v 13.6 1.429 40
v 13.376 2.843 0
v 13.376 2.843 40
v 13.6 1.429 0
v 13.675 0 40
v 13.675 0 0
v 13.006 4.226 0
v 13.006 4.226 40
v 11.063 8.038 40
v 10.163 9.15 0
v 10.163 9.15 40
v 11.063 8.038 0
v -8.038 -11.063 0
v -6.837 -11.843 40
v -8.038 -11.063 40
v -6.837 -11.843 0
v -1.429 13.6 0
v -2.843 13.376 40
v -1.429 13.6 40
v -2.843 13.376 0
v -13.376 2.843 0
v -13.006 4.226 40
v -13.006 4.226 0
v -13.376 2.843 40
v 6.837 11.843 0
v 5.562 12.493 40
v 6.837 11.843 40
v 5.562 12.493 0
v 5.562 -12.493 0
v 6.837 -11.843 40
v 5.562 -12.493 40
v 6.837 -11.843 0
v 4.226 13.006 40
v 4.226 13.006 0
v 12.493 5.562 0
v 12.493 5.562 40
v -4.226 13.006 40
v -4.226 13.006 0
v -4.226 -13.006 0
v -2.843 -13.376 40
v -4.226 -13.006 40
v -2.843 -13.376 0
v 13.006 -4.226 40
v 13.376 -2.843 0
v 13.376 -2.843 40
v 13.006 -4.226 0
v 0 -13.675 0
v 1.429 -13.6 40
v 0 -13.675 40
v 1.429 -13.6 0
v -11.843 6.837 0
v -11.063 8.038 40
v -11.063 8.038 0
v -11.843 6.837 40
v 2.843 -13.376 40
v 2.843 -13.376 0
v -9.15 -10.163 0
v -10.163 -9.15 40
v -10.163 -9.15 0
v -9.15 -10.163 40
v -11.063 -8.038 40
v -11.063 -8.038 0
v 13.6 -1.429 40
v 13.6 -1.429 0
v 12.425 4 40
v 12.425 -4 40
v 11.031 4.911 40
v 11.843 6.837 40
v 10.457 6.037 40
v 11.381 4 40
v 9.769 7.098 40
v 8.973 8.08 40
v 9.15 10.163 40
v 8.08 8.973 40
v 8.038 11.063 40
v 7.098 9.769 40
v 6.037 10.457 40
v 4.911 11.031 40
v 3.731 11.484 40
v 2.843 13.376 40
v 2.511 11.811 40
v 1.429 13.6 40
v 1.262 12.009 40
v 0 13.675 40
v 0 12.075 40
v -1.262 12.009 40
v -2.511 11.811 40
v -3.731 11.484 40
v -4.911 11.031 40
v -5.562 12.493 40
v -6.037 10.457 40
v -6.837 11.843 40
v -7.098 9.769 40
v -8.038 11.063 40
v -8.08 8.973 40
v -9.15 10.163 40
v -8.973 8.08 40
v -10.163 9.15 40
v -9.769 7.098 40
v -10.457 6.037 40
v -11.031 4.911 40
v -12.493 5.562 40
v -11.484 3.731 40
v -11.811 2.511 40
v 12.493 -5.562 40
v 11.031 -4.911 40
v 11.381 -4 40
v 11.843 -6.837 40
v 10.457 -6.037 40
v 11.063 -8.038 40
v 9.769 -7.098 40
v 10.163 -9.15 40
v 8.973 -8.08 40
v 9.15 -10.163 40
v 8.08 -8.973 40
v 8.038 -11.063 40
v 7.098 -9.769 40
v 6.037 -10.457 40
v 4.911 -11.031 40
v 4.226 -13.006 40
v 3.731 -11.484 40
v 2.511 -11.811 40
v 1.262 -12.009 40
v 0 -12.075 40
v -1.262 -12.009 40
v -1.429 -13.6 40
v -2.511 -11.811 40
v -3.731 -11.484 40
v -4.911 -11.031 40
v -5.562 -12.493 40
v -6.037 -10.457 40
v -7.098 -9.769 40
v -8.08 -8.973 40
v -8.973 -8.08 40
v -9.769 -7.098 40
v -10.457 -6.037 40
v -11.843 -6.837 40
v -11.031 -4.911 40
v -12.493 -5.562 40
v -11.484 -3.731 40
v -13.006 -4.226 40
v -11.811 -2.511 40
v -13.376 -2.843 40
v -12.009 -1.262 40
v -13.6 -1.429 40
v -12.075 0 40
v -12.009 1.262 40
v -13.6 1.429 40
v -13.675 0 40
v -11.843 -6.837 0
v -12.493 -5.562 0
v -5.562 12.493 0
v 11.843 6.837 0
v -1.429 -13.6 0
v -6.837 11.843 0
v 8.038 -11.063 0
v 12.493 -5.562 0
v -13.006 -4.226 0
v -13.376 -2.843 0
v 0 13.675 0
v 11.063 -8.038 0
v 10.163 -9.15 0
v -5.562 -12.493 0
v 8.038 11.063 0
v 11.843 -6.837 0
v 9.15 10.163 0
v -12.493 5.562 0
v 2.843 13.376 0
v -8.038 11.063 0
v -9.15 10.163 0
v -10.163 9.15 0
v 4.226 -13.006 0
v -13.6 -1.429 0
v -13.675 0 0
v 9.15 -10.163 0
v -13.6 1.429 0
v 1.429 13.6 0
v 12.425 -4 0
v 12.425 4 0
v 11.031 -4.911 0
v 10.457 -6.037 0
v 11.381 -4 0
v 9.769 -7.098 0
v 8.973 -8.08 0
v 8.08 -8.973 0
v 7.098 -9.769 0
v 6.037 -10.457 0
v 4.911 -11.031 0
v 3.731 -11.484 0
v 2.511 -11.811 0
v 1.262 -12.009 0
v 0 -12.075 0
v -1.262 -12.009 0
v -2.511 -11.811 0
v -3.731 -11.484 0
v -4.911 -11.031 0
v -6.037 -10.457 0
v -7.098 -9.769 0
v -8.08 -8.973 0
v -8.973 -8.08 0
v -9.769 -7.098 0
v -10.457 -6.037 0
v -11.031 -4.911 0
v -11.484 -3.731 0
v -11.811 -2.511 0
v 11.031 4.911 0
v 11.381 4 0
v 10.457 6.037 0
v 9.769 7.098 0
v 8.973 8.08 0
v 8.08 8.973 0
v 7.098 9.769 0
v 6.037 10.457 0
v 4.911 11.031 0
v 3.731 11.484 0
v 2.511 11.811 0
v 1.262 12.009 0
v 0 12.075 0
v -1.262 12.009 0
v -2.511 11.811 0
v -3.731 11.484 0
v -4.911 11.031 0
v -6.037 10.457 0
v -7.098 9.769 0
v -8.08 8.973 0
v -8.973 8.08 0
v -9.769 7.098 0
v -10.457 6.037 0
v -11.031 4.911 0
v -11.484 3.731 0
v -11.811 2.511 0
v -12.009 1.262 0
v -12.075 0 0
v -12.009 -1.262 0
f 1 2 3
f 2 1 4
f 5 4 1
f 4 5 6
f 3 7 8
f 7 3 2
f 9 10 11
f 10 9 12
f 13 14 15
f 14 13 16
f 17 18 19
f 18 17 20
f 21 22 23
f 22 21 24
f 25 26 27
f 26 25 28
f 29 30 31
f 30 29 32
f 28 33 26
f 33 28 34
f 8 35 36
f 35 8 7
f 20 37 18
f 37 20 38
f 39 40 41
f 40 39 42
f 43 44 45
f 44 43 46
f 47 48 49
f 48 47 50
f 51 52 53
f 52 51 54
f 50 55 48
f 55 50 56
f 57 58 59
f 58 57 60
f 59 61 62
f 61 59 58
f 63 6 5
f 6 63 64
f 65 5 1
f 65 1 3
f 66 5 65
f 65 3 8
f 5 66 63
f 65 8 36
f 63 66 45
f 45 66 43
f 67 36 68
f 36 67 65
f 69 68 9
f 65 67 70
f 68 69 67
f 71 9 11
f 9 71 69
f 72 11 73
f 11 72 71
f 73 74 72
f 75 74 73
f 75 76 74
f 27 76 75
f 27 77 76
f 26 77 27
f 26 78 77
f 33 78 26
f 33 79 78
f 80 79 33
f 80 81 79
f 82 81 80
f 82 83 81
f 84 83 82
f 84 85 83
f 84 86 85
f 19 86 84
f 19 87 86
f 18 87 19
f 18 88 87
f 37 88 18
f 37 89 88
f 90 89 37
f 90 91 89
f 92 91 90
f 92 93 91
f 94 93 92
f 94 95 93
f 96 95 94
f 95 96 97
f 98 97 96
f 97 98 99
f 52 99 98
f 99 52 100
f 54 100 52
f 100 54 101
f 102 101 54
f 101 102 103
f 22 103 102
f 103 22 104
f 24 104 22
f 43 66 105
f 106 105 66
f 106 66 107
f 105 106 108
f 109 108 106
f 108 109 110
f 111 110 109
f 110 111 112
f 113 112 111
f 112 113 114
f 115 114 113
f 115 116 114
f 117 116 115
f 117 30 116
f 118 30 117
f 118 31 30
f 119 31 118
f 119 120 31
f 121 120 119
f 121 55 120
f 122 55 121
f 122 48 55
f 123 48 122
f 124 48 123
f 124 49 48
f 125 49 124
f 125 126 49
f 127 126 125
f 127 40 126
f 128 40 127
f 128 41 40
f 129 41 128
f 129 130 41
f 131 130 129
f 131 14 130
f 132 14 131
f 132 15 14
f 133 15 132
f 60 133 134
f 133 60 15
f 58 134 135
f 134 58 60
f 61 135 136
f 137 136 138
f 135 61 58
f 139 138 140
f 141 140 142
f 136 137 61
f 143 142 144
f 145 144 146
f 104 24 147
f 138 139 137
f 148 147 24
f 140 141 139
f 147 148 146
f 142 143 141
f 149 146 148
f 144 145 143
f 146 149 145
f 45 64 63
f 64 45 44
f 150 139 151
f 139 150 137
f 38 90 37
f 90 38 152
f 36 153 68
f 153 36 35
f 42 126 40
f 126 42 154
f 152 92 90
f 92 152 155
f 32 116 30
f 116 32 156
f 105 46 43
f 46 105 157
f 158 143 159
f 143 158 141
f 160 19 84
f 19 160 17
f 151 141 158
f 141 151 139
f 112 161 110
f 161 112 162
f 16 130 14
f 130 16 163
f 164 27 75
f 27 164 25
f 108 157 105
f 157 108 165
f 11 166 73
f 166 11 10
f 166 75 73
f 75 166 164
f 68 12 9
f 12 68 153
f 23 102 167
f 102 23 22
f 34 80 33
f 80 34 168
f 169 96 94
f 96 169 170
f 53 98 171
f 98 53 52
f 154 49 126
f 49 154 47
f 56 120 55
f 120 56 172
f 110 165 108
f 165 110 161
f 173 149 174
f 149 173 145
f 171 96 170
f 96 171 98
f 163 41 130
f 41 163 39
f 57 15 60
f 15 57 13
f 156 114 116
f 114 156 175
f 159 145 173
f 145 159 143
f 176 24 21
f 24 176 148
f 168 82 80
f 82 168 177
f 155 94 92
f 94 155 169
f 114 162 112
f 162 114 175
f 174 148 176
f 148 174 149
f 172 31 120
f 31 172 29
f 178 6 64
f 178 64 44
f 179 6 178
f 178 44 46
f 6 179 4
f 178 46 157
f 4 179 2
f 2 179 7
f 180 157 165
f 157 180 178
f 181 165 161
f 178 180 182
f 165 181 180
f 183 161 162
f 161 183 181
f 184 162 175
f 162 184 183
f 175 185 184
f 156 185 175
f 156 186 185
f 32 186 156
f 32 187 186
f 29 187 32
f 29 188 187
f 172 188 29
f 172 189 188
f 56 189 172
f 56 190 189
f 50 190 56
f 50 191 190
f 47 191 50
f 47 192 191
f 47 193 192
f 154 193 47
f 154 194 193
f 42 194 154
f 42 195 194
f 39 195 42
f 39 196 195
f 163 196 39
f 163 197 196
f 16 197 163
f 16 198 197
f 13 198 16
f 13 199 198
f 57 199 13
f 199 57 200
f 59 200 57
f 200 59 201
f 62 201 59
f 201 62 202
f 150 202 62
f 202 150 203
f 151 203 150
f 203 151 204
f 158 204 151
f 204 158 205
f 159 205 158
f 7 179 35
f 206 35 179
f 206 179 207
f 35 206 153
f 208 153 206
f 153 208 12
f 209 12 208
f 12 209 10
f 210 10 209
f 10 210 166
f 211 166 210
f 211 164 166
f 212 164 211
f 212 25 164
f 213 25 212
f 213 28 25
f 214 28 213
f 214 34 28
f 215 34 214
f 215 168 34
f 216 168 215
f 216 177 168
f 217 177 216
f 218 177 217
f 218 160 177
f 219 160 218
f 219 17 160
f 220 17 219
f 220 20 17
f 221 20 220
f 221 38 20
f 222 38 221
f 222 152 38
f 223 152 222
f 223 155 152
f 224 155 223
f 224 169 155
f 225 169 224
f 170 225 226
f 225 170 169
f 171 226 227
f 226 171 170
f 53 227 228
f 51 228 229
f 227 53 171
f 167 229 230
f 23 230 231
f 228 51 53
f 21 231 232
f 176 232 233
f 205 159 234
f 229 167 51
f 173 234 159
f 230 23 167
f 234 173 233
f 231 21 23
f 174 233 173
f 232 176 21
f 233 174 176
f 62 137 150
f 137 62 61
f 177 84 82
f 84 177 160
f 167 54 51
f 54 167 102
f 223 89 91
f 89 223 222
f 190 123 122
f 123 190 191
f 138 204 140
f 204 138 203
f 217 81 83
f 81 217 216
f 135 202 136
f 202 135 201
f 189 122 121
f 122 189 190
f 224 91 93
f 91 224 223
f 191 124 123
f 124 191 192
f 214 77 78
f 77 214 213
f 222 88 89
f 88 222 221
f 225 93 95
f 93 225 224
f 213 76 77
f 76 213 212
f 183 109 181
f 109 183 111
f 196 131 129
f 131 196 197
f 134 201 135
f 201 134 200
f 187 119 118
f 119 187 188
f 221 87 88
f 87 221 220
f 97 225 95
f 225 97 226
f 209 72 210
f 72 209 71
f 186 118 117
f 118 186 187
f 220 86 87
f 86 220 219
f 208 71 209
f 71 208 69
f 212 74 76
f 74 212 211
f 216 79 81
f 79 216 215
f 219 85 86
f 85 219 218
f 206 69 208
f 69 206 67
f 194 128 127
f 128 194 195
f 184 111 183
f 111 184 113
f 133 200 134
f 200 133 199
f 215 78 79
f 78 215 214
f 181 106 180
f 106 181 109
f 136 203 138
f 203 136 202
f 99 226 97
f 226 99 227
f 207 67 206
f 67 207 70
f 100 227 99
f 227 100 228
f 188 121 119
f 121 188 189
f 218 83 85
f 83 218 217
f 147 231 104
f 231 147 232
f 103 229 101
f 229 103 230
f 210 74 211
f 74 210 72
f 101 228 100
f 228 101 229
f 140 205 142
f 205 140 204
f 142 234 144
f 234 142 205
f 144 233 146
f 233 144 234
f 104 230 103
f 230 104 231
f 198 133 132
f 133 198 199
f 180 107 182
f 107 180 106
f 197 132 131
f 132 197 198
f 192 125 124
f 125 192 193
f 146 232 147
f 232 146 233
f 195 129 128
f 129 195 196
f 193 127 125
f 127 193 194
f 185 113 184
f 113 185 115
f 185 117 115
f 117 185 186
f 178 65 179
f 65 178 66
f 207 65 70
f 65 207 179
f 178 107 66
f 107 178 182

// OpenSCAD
// OpenSCAD: screwdriver button blocker — блокировщик кнопок отвёртки
// Версия: v1.0 — initial

description = "Cylindrical tube that fits over screwdriver to block button presses";
version_str = "1.0";

// ===== Комментарии ===========================
/*
Модель: цилиндрическая втулка для блокировки кнопок отвёртки
Блоки:
- Переменные (вверху) для всех размеров
- Комментарии (этот блок)
- Функции фрагментов детали (ниже)
- Функция вывода всех фрагментов show_all()
- Функция обрезки через intersection при test_fragment=true

Детали: base (основная деталь - полый цилиндр)
Фрагменты:
- base — полый цилиндр с внутренним диаметром 23.8 мм, длиной 40 мм, толщиной стенки 1.2 мм
- notch — прямоугольный вырез в стенке цилиндра (difference): длина 34 мм, ширина 7 мм, глубина 0.5 мм

План: 
- Создать полый цилиндр через difference внешнего и внутреннего цилиндров
- Вырезать паз (notch) в стенке цилиндра для доступа к кнопкам
- Ориентация: цилиндр стоит вертикально, ось Z вверх
*/

use <../modules.scad>;

// ===== Точность аппроксимации окружностей =====
$fn = 0;        // фиксированную сегментацию отключаем
$fa = 6;        // 5–8° обычно достаточно
$fs = 0.35;     // ≈ диаметр сопла (0.3–0.5 для сопла 0.4)
pin_fs = 0.25;  // чуть тоньше для штырей и отверстий

// ===== Режим печати тест‑фрагментов =====
test_fragment = false;   // true — печатать только угловые фрагменты
frag_size     = 20;      // размер квадрата вырезки, мм
frag_index    = 0;       // 0=НЛ, 1=ВЛ, 2=НП, 3=ВП (относительно основания)
frag_gap_x    = 10;      // зазор между фрагментами по X, мм
frag_h_extra  = 20;      // запас по высоте клипа, мм

// ===== Общие доп. параметры =====
tiny = 0.1;                  // небольшой зазор для булевых операций
edge_chamfer_z = 1;       // высота фаски по Z (мм)
edge_chamfer_x = 5;       // горизонтальный вылет фаски по X (с каждой стороны), мм
edge_chamfer_y = 5;       // горизонтальный вылет фаски по Y (с каждой стороны), мм
screen_frame_gap = 0.2;      // только для высоты вычитаний в рамке (не влияет на XY)

// ===== Параметры модели =====
// Основные размеры цилиндра
inner_diameter = 24.15;    // внутренний диаметр цилиндра, мм
length = 40;               // длина цилиндра, мм
wall_thickness = 1.6;      // толщина стенки, мм

// Параметры паза (notch)
notch_length = 40;         // длина паза по оси цилиндра, мм
notch_width = 8;           // ширина паза по окружности, мм
notch_depth = 1.0;         // глубина паза в стенку, мм
notch_offset = 0;          // смещение паза от начала цилиндра, мм
notch_inner_offset = 0.8;  // смещение паза внутрь от внешней поверхности, мм

// ===== Вычисляемые размеры =====
inner_radius = inner_diameter / 2;
outer_diameter = inner_diameter + 2 * wall_thickness;
outer_radius = outer_diameter / 2;

// Для клиппера фрагментов
base_h = length;

// ===== Вспомогательные функции ====================
function clamp(val, lo, hi) = max(lo, min(val, hi));
function clamp_chz(t, chz) = clamp(chz, 0, t/2);

// ===== Модули деталей ====================
// Основная деталь: полый цилиндр с пазом
module base() {
  difference() {
    // Внешний цилиндр
    cylinder(h=length, d=outer_diameter, $fs=pin_fs, $fa=6);
    
    // Внутренний цилиндр (вырез)
    translate([0, 0, -tiny])
      cylinder(h=length + 2*tiny, d=inner_diameter, $fs=pin_fs, $fa=6);
    
    // Паз (notch) в стенке цилиндра
    // Позиционируем паз: смещение от начала цилиндра, вырез в радиальном направлении
    translate([0, 0, (length-notch_length)/2 + notch_length/2]) {
      // Вырезаем прямоугольный паз
      // Позиционируем так, чтобы паз начинался от внешнего радиуса минус смещение внутрь и углублялся на notch_depth
      translate([outer_radius - notch_inner_offset - notch_depth, 0, 0]) {
        // Создаём куб для выреза паза
        // Размеры: глубина (радиально), ширина (по окружности), длина (по оси)
        cube([notch_depth + tiny, notch_width, notch_length], center=true);
      }
    }
  }
}

// ===== Вывод всех фрагментов ====================
module show_all() {
  if (test_fragment) {
    // Режим тест-фрагментов: обрезка через intersection
    intersection() {
      base();
      // Вырезка углового фрагмента
      // Для цилиндра используем куб, который вырезает часть цилиндра
      // Позиционируем куб так, чтобы он захватывал часть цилиндра с пазом
      translate([-outer_radius, -outer_radius, -frag_h_extra]) {
        cube([frag_size, frag_size, length + 2*frag_h_extra], center=false);
      }
    }
  } else {
    // Полный рендер
    base();
  }
}

// ===== Точка входа ====================
show_all();
